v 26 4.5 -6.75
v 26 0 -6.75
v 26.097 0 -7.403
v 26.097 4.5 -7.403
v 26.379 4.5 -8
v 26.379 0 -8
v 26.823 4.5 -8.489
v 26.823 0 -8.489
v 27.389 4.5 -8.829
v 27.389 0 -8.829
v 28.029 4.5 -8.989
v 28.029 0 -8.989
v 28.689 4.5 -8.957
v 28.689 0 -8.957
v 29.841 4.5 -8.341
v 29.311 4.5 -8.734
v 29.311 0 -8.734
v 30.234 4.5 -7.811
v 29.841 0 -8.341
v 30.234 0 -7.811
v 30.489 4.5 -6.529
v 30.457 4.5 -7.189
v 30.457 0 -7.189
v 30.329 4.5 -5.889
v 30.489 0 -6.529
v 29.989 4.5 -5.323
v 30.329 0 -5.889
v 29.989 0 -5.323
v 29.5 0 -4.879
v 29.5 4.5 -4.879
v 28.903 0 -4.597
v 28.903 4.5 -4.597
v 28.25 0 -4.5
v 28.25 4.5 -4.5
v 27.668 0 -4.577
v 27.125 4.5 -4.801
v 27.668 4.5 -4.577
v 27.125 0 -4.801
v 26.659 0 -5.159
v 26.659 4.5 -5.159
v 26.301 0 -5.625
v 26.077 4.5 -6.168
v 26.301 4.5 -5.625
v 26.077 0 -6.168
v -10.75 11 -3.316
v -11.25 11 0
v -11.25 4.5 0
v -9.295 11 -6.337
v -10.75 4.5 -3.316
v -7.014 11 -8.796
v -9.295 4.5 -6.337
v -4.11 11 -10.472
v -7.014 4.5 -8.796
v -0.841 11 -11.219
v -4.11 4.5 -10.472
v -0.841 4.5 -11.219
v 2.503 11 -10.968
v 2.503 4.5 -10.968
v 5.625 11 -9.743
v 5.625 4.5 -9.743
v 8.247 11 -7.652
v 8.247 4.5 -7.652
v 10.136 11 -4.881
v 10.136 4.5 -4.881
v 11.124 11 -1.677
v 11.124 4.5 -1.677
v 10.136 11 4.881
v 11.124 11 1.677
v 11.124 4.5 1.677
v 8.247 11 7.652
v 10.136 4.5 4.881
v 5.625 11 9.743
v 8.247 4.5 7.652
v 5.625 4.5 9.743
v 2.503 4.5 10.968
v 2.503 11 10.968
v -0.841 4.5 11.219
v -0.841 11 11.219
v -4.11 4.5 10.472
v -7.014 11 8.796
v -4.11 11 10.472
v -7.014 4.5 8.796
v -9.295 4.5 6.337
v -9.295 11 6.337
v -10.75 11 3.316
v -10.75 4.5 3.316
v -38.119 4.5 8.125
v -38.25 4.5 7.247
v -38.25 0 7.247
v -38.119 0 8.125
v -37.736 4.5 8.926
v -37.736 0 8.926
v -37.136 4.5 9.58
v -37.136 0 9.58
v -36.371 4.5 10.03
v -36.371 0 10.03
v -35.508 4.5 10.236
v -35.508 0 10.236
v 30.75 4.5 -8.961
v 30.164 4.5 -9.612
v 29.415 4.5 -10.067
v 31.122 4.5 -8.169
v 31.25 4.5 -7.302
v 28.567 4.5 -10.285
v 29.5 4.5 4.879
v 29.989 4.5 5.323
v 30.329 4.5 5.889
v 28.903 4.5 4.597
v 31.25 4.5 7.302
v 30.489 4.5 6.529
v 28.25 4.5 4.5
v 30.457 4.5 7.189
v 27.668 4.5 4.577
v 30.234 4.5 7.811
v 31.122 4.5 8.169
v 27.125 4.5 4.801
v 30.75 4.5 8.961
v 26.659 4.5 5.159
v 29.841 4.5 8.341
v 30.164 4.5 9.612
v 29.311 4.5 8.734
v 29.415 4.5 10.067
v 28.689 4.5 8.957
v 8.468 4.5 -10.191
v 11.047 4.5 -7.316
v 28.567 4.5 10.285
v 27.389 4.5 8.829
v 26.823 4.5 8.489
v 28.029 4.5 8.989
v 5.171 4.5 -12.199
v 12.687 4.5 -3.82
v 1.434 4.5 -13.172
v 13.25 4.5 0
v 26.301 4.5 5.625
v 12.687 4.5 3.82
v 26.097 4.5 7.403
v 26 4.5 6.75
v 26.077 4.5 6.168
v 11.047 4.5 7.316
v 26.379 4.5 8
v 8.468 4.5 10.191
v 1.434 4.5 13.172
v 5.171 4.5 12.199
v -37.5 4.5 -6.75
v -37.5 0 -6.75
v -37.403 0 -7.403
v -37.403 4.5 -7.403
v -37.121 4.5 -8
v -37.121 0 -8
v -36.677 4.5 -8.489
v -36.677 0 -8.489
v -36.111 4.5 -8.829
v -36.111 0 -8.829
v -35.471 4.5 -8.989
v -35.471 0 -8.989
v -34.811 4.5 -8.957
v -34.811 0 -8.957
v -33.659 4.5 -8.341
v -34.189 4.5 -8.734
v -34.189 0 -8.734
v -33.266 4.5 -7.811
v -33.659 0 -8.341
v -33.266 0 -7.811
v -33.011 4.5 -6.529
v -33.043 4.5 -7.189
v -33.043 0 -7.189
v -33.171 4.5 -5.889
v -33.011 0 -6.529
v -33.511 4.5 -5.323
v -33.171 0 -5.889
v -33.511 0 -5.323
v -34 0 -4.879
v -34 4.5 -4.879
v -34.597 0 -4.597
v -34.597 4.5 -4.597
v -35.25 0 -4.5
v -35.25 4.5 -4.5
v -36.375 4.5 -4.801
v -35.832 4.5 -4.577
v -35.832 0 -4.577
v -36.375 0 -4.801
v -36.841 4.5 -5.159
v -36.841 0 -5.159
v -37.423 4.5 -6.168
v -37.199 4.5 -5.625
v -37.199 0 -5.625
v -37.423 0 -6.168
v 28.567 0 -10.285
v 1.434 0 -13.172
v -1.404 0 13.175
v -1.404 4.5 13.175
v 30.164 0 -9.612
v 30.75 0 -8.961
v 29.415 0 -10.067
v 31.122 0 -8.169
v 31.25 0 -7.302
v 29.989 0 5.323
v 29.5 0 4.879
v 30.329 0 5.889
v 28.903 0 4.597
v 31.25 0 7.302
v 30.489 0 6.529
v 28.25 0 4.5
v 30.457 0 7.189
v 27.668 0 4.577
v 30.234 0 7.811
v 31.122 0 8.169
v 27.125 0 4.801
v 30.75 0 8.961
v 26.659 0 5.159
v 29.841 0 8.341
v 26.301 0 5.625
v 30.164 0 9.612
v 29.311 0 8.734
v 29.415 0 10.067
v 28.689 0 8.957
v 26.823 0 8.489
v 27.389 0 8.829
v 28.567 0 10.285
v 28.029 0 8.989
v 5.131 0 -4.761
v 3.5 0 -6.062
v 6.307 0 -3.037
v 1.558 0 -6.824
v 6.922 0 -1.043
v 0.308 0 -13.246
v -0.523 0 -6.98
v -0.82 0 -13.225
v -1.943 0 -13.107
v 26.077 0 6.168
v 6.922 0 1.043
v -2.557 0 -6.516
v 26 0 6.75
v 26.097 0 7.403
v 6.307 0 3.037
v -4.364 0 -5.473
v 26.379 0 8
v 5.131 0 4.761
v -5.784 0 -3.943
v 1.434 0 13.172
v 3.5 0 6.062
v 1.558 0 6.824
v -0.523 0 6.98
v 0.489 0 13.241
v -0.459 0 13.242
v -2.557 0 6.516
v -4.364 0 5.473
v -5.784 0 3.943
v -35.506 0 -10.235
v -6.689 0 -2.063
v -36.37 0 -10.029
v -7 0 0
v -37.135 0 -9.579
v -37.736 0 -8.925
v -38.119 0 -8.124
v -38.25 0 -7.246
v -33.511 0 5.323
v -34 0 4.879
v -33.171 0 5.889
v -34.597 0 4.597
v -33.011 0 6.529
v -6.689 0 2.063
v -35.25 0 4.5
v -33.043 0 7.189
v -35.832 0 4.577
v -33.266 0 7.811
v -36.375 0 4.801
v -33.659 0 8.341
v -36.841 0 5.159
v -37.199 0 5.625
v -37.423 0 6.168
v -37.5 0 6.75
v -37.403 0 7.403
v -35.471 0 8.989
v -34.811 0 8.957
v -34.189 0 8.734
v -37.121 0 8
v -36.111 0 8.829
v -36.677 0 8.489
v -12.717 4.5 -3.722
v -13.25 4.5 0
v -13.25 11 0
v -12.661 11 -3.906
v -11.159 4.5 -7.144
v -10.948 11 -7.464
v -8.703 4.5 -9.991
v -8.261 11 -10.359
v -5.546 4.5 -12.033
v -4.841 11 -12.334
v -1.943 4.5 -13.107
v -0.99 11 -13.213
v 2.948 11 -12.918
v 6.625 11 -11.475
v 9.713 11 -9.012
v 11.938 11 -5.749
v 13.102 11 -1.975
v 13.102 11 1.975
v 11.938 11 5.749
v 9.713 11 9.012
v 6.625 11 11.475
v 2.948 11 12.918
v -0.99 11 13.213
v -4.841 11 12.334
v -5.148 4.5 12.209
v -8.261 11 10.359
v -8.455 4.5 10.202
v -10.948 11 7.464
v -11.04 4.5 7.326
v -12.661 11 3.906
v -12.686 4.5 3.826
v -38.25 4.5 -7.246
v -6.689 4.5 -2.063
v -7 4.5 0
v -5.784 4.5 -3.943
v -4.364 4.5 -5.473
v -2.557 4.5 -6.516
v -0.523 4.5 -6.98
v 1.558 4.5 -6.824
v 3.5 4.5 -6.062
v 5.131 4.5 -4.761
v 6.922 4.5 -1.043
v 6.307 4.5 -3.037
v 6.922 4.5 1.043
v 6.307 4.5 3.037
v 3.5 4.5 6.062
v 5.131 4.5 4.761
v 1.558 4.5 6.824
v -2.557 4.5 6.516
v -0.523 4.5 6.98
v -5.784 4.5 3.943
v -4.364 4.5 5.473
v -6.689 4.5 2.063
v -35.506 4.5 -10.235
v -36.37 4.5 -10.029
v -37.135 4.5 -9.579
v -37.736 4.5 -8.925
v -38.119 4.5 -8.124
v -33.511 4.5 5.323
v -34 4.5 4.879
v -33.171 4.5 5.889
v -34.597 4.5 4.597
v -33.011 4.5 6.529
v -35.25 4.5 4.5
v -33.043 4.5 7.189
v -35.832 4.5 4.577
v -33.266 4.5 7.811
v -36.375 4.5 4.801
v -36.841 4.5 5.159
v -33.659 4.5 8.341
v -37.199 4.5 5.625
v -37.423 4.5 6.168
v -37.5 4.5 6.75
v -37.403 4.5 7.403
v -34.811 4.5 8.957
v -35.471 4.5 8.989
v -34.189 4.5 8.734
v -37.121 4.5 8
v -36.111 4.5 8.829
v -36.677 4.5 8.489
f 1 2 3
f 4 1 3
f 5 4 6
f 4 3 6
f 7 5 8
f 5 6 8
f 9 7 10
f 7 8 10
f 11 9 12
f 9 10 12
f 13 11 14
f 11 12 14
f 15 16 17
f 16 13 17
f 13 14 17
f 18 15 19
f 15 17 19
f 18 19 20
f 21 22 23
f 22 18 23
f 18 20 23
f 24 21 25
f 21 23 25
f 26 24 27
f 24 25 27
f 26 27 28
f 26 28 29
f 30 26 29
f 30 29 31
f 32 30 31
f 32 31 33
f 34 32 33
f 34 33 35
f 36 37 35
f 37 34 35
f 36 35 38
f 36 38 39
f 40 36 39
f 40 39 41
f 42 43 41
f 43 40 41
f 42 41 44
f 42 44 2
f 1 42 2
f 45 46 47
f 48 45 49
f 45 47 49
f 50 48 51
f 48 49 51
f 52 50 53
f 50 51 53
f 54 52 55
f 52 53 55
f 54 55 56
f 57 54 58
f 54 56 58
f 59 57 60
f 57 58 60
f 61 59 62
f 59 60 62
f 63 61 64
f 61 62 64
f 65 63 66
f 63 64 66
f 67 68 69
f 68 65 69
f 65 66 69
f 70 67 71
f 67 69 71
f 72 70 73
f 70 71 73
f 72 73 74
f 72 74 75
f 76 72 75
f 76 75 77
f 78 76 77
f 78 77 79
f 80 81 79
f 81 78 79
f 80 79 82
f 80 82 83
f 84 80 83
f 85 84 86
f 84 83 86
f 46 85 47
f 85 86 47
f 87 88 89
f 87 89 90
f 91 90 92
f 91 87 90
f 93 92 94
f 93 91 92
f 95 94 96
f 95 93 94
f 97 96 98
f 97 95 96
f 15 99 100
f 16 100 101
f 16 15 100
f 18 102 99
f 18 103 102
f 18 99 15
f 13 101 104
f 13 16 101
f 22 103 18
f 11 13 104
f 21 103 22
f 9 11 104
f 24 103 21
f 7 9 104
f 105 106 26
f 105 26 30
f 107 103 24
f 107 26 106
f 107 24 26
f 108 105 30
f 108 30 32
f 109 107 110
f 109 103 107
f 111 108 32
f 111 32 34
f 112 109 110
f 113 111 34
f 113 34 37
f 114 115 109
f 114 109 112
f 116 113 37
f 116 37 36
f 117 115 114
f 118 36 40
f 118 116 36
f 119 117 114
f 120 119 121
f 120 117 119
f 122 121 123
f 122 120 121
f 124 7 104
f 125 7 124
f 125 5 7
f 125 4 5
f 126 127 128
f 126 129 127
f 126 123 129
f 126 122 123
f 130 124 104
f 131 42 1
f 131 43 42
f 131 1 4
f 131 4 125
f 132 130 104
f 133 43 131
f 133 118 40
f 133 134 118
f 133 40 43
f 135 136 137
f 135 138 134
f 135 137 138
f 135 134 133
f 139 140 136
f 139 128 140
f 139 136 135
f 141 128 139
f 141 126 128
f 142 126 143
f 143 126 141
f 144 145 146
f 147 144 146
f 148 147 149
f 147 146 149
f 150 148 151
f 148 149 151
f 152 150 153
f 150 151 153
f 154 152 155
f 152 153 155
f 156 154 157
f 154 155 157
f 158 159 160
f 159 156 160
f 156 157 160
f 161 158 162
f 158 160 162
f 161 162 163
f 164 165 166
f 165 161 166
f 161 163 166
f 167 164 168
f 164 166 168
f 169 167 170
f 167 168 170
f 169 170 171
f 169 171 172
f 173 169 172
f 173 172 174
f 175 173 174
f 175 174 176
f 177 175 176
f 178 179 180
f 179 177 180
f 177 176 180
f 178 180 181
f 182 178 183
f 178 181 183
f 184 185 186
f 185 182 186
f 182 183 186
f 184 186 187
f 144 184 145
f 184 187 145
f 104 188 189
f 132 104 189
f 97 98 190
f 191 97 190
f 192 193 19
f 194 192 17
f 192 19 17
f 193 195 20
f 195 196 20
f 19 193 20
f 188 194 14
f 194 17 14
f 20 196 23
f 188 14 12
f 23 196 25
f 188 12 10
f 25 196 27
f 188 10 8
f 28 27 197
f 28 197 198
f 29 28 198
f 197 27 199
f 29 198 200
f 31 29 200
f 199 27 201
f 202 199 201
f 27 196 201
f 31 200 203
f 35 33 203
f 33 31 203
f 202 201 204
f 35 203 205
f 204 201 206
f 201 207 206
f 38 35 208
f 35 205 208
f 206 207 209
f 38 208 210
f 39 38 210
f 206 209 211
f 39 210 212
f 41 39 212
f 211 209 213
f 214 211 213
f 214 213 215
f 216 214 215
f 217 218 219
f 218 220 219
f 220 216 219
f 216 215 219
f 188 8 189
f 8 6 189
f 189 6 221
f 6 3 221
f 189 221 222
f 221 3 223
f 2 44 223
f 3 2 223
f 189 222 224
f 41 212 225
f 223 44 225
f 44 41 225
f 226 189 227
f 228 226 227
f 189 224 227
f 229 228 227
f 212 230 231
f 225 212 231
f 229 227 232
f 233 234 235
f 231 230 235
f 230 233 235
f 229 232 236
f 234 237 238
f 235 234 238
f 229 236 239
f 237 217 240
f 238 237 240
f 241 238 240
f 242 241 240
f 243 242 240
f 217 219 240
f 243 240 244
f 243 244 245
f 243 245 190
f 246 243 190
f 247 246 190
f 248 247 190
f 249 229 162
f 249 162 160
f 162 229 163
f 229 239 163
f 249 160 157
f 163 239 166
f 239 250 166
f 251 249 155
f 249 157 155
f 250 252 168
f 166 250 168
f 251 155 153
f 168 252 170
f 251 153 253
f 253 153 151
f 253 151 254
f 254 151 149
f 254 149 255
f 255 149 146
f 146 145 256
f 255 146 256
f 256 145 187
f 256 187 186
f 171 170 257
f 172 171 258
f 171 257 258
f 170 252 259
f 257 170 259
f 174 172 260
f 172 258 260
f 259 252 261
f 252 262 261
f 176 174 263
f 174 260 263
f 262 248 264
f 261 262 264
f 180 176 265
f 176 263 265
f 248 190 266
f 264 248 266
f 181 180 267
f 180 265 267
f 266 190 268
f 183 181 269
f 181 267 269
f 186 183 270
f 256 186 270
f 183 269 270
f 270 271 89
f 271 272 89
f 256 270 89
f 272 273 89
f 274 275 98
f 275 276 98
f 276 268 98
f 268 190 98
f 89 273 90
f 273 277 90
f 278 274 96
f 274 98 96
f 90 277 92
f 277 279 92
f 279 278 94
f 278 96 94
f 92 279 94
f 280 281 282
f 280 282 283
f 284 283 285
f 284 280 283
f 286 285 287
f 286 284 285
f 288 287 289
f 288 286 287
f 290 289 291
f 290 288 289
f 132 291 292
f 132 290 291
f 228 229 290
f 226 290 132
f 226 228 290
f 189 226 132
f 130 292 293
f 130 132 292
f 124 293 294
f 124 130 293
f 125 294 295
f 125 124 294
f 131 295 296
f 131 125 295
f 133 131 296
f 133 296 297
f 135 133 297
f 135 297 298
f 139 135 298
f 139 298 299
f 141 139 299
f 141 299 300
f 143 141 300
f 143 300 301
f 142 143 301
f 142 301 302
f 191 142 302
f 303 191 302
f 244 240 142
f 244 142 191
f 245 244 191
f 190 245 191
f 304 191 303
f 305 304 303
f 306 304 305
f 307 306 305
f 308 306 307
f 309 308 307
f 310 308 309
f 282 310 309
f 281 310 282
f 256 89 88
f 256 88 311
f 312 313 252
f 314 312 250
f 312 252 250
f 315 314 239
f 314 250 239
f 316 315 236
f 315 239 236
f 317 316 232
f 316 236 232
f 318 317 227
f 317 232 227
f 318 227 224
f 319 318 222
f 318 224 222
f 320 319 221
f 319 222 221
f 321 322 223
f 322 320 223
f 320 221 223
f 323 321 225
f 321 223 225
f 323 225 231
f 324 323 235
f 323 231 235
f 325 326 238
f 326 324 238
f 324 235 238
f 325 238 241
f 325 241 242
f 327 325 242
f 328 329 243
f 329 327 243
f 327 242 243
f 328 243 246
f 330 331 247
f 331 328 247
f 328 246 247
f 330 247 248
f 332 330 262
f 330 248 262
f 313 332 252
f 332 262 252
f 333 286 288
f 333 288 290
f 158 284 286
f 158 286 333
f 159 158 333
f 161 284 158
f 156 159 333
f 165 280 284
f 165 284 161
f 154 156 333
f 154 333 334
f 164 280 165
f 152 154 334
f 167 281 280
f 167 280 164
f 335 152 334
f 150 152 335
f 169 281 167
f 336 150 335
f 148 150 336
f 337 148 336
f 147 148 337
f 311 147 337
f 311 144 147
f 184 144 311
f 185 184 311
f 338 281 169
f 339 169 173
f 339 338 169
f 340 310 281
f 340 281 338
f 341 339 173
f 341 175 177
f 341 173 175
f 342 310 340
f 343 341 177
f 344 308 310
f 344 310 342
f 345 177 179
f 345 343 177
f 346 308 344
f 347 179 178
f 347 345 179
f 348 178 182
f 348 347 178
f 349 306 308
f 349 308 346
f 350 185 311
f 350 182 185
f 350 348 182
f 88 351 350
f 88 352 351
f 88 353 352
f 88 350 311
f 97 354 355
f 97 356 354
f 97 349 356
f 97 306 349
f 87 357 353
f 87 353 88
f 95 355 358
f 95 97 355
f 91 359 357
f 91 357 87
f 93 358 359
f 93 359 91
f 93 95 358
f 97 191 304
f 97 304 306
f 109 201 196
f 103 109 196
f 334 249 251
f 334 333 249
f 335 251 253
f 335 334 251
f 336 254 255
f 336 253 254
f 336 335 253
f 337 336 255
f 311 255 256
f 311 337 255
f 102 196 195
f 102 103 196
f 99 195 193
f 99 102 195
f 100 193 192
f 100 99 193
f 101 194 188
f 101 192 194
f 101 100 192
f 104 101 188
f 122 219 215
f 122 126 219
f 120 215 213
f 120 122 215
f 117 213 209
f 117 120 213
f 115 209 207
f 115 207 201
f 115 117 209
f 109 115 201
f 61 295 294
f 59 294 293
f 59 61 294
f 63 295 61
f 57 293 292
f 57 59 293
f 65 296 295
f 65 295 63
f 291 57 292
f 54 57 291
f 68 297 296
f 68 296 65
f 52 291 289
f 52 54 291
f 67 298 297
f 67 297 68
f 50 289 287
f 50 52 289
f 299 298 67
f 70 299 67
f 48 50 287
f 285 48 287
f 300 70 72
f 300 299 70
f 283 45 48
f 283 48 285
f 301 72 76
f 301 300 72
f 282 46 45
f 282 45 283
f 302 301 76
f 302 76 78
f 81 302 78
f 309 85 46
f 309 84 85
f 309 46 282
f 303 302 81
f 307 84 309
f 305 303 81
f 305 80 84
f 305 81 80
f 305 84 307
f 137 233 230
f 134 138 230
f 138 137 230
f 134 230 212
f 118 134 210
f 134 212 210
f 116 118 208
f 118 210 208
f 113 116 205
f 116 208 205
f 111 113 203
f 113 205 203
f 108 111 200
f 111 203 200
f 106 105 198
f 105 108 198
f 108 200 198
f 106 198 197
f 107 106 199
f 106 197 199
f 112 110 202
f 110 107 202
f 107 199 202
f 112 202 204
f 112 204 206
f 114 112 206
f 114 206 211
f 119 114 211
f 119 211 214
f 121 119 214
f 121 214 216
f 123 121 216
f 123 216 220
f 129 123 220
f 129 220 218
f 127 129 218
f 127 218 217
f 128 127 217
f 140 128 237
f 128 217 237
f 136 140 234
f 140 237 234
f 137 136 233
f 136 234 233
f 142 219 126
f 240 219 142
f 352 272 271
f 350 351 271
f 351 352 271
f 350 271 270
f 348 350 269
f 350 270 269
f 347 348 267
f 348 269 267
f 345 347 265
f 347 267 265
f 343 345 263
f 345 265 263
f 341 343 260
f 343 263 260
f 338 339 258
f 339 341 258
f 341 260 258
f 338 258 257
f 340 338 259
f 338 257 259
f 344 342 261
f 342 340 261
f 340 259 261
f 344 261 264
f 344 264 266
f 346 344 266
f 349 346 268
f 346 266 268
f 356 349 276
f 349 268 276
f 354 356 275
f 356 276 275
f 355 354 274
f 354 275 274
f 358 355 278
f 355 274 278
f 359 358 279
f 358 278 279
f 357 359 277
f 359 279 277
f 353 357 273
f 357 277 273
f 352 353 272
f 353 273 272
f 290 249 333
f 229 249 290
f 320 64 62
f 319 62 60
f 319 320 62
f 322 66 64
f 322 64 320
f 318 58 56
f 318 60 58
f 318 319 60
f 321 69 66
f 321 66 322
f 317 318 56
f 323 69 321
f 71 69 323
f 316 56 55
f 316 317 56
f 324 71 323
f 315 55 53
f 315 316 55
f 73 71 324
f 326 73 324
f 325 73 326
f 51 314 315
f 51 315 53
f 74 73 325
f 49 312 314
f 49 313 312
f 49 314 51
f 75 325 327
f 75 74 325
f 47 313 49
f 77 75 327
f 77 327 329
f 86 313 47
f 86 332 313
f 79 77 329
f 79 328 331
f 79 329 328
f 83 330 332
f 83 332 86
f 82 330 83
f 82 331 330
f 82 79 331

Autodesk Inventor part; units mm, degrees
sketch "Sketch1" plane through (0, 0, 0) normal (0, 1, 0) x (-1, 0, 0)
  circle A0 centre (0, 0) radius 7
  line L0 (0, 0) -> (-31.25, 0)
  line L1 (-31.25, 0) -> (-31.25, -10)
  line L2 (-31.25, 0) -> (-31.25, 10)
  line L3 (-31.25, -10) -> (-1.4018, -13.1756)
  line L4 (-31.25, 10) -> (-1.4018, 13.1756)
  line L5 (0, 0) -> (38.25, 0)
  line L6 (38.25, 0) -> (38.25, -10)
  line L7 (38.25, -10) -> (1.1388, -13.1756)
  line L8 (38.25, 0) -> (38.25, 10)
  line L9 (38.25, 10) -> (1.4018, 13.1756)
  line L10 (-31.25, 0) -> (-28.25, 0)
  line L11 (-28.25, 0) -> (-28.25, -6.75)
  line L12 (-28.25, 0) -> (-28.25, 6.75)
  circle A1 centre (-28.25, -6.75) radius 2.25
  circle A2 centre (-28.25, 6.75) radius 2.25
  line L13 (38.25, 0) -> (35.25, 0)
  line L14 (35.25, 0) -> (35.25, -6.75)
  line L15 (35.25, 0) -> (35.25, 6.75)
  circle A3 centre (35.25, -6.75) radius 2.25
  circle A4 centre (35.25, 6.75) radius 2.25
  line L16 (1.1388, -13.1756) -> (-1.4018, -13.1756)
  line L17 (1.4018, 13.1756) -> (-1.4018, 13.1756)
  dimension "d2" = 14
  dimension "d3" = 31.25
  dimension "d4" = 10
  dimension "d5" = 10
  dimension "d6" = 38.25
  dimension "d7" = 10
  dimension "d8" = 10
  dimension "d9" = 3
  dimension "d10" = 6.75
  dimension "d11" = 6.75
  dimension "d12" = 4.5
  dimension "d13" = 4.5
  dimension "d14" = 3
  dimension "d15" = 6.75
  dimension "d16" = 6.75
  dimension "d17" = 4.5
  dimension "d18" = 4.5
extrude "Extrusion1" add sketch "Sketch1" along normal blind 4.5 contours L5 L6 L7 L16 L3 L1 L0 A0 | A0 L0 L2 L4 L17 L9 L8 L5
sketch "Sketch2" plane through (0, 0, 0) normal (0, 1, 0) x (-1, 0, 0)
  circle A0 centre (0, 0) radius 13.25
  circle A1 centre (0, 0) radius 11.25
  dimension "d21" = 26.5
  dimension "d22" = 22.5
extrude "Extrusion2" add sketch "Sketch2" along normal blind 11
fillet "Fillet1" radius 3 1 edges at (-38.25, 2.25, -10)
fillet "Fillet2" radius 3 3 edges at (-38.25, 2.25, 10) (31.25, 2.25, 10) (31.25, 2.25, -10)
properties part number "bearing_holder"
